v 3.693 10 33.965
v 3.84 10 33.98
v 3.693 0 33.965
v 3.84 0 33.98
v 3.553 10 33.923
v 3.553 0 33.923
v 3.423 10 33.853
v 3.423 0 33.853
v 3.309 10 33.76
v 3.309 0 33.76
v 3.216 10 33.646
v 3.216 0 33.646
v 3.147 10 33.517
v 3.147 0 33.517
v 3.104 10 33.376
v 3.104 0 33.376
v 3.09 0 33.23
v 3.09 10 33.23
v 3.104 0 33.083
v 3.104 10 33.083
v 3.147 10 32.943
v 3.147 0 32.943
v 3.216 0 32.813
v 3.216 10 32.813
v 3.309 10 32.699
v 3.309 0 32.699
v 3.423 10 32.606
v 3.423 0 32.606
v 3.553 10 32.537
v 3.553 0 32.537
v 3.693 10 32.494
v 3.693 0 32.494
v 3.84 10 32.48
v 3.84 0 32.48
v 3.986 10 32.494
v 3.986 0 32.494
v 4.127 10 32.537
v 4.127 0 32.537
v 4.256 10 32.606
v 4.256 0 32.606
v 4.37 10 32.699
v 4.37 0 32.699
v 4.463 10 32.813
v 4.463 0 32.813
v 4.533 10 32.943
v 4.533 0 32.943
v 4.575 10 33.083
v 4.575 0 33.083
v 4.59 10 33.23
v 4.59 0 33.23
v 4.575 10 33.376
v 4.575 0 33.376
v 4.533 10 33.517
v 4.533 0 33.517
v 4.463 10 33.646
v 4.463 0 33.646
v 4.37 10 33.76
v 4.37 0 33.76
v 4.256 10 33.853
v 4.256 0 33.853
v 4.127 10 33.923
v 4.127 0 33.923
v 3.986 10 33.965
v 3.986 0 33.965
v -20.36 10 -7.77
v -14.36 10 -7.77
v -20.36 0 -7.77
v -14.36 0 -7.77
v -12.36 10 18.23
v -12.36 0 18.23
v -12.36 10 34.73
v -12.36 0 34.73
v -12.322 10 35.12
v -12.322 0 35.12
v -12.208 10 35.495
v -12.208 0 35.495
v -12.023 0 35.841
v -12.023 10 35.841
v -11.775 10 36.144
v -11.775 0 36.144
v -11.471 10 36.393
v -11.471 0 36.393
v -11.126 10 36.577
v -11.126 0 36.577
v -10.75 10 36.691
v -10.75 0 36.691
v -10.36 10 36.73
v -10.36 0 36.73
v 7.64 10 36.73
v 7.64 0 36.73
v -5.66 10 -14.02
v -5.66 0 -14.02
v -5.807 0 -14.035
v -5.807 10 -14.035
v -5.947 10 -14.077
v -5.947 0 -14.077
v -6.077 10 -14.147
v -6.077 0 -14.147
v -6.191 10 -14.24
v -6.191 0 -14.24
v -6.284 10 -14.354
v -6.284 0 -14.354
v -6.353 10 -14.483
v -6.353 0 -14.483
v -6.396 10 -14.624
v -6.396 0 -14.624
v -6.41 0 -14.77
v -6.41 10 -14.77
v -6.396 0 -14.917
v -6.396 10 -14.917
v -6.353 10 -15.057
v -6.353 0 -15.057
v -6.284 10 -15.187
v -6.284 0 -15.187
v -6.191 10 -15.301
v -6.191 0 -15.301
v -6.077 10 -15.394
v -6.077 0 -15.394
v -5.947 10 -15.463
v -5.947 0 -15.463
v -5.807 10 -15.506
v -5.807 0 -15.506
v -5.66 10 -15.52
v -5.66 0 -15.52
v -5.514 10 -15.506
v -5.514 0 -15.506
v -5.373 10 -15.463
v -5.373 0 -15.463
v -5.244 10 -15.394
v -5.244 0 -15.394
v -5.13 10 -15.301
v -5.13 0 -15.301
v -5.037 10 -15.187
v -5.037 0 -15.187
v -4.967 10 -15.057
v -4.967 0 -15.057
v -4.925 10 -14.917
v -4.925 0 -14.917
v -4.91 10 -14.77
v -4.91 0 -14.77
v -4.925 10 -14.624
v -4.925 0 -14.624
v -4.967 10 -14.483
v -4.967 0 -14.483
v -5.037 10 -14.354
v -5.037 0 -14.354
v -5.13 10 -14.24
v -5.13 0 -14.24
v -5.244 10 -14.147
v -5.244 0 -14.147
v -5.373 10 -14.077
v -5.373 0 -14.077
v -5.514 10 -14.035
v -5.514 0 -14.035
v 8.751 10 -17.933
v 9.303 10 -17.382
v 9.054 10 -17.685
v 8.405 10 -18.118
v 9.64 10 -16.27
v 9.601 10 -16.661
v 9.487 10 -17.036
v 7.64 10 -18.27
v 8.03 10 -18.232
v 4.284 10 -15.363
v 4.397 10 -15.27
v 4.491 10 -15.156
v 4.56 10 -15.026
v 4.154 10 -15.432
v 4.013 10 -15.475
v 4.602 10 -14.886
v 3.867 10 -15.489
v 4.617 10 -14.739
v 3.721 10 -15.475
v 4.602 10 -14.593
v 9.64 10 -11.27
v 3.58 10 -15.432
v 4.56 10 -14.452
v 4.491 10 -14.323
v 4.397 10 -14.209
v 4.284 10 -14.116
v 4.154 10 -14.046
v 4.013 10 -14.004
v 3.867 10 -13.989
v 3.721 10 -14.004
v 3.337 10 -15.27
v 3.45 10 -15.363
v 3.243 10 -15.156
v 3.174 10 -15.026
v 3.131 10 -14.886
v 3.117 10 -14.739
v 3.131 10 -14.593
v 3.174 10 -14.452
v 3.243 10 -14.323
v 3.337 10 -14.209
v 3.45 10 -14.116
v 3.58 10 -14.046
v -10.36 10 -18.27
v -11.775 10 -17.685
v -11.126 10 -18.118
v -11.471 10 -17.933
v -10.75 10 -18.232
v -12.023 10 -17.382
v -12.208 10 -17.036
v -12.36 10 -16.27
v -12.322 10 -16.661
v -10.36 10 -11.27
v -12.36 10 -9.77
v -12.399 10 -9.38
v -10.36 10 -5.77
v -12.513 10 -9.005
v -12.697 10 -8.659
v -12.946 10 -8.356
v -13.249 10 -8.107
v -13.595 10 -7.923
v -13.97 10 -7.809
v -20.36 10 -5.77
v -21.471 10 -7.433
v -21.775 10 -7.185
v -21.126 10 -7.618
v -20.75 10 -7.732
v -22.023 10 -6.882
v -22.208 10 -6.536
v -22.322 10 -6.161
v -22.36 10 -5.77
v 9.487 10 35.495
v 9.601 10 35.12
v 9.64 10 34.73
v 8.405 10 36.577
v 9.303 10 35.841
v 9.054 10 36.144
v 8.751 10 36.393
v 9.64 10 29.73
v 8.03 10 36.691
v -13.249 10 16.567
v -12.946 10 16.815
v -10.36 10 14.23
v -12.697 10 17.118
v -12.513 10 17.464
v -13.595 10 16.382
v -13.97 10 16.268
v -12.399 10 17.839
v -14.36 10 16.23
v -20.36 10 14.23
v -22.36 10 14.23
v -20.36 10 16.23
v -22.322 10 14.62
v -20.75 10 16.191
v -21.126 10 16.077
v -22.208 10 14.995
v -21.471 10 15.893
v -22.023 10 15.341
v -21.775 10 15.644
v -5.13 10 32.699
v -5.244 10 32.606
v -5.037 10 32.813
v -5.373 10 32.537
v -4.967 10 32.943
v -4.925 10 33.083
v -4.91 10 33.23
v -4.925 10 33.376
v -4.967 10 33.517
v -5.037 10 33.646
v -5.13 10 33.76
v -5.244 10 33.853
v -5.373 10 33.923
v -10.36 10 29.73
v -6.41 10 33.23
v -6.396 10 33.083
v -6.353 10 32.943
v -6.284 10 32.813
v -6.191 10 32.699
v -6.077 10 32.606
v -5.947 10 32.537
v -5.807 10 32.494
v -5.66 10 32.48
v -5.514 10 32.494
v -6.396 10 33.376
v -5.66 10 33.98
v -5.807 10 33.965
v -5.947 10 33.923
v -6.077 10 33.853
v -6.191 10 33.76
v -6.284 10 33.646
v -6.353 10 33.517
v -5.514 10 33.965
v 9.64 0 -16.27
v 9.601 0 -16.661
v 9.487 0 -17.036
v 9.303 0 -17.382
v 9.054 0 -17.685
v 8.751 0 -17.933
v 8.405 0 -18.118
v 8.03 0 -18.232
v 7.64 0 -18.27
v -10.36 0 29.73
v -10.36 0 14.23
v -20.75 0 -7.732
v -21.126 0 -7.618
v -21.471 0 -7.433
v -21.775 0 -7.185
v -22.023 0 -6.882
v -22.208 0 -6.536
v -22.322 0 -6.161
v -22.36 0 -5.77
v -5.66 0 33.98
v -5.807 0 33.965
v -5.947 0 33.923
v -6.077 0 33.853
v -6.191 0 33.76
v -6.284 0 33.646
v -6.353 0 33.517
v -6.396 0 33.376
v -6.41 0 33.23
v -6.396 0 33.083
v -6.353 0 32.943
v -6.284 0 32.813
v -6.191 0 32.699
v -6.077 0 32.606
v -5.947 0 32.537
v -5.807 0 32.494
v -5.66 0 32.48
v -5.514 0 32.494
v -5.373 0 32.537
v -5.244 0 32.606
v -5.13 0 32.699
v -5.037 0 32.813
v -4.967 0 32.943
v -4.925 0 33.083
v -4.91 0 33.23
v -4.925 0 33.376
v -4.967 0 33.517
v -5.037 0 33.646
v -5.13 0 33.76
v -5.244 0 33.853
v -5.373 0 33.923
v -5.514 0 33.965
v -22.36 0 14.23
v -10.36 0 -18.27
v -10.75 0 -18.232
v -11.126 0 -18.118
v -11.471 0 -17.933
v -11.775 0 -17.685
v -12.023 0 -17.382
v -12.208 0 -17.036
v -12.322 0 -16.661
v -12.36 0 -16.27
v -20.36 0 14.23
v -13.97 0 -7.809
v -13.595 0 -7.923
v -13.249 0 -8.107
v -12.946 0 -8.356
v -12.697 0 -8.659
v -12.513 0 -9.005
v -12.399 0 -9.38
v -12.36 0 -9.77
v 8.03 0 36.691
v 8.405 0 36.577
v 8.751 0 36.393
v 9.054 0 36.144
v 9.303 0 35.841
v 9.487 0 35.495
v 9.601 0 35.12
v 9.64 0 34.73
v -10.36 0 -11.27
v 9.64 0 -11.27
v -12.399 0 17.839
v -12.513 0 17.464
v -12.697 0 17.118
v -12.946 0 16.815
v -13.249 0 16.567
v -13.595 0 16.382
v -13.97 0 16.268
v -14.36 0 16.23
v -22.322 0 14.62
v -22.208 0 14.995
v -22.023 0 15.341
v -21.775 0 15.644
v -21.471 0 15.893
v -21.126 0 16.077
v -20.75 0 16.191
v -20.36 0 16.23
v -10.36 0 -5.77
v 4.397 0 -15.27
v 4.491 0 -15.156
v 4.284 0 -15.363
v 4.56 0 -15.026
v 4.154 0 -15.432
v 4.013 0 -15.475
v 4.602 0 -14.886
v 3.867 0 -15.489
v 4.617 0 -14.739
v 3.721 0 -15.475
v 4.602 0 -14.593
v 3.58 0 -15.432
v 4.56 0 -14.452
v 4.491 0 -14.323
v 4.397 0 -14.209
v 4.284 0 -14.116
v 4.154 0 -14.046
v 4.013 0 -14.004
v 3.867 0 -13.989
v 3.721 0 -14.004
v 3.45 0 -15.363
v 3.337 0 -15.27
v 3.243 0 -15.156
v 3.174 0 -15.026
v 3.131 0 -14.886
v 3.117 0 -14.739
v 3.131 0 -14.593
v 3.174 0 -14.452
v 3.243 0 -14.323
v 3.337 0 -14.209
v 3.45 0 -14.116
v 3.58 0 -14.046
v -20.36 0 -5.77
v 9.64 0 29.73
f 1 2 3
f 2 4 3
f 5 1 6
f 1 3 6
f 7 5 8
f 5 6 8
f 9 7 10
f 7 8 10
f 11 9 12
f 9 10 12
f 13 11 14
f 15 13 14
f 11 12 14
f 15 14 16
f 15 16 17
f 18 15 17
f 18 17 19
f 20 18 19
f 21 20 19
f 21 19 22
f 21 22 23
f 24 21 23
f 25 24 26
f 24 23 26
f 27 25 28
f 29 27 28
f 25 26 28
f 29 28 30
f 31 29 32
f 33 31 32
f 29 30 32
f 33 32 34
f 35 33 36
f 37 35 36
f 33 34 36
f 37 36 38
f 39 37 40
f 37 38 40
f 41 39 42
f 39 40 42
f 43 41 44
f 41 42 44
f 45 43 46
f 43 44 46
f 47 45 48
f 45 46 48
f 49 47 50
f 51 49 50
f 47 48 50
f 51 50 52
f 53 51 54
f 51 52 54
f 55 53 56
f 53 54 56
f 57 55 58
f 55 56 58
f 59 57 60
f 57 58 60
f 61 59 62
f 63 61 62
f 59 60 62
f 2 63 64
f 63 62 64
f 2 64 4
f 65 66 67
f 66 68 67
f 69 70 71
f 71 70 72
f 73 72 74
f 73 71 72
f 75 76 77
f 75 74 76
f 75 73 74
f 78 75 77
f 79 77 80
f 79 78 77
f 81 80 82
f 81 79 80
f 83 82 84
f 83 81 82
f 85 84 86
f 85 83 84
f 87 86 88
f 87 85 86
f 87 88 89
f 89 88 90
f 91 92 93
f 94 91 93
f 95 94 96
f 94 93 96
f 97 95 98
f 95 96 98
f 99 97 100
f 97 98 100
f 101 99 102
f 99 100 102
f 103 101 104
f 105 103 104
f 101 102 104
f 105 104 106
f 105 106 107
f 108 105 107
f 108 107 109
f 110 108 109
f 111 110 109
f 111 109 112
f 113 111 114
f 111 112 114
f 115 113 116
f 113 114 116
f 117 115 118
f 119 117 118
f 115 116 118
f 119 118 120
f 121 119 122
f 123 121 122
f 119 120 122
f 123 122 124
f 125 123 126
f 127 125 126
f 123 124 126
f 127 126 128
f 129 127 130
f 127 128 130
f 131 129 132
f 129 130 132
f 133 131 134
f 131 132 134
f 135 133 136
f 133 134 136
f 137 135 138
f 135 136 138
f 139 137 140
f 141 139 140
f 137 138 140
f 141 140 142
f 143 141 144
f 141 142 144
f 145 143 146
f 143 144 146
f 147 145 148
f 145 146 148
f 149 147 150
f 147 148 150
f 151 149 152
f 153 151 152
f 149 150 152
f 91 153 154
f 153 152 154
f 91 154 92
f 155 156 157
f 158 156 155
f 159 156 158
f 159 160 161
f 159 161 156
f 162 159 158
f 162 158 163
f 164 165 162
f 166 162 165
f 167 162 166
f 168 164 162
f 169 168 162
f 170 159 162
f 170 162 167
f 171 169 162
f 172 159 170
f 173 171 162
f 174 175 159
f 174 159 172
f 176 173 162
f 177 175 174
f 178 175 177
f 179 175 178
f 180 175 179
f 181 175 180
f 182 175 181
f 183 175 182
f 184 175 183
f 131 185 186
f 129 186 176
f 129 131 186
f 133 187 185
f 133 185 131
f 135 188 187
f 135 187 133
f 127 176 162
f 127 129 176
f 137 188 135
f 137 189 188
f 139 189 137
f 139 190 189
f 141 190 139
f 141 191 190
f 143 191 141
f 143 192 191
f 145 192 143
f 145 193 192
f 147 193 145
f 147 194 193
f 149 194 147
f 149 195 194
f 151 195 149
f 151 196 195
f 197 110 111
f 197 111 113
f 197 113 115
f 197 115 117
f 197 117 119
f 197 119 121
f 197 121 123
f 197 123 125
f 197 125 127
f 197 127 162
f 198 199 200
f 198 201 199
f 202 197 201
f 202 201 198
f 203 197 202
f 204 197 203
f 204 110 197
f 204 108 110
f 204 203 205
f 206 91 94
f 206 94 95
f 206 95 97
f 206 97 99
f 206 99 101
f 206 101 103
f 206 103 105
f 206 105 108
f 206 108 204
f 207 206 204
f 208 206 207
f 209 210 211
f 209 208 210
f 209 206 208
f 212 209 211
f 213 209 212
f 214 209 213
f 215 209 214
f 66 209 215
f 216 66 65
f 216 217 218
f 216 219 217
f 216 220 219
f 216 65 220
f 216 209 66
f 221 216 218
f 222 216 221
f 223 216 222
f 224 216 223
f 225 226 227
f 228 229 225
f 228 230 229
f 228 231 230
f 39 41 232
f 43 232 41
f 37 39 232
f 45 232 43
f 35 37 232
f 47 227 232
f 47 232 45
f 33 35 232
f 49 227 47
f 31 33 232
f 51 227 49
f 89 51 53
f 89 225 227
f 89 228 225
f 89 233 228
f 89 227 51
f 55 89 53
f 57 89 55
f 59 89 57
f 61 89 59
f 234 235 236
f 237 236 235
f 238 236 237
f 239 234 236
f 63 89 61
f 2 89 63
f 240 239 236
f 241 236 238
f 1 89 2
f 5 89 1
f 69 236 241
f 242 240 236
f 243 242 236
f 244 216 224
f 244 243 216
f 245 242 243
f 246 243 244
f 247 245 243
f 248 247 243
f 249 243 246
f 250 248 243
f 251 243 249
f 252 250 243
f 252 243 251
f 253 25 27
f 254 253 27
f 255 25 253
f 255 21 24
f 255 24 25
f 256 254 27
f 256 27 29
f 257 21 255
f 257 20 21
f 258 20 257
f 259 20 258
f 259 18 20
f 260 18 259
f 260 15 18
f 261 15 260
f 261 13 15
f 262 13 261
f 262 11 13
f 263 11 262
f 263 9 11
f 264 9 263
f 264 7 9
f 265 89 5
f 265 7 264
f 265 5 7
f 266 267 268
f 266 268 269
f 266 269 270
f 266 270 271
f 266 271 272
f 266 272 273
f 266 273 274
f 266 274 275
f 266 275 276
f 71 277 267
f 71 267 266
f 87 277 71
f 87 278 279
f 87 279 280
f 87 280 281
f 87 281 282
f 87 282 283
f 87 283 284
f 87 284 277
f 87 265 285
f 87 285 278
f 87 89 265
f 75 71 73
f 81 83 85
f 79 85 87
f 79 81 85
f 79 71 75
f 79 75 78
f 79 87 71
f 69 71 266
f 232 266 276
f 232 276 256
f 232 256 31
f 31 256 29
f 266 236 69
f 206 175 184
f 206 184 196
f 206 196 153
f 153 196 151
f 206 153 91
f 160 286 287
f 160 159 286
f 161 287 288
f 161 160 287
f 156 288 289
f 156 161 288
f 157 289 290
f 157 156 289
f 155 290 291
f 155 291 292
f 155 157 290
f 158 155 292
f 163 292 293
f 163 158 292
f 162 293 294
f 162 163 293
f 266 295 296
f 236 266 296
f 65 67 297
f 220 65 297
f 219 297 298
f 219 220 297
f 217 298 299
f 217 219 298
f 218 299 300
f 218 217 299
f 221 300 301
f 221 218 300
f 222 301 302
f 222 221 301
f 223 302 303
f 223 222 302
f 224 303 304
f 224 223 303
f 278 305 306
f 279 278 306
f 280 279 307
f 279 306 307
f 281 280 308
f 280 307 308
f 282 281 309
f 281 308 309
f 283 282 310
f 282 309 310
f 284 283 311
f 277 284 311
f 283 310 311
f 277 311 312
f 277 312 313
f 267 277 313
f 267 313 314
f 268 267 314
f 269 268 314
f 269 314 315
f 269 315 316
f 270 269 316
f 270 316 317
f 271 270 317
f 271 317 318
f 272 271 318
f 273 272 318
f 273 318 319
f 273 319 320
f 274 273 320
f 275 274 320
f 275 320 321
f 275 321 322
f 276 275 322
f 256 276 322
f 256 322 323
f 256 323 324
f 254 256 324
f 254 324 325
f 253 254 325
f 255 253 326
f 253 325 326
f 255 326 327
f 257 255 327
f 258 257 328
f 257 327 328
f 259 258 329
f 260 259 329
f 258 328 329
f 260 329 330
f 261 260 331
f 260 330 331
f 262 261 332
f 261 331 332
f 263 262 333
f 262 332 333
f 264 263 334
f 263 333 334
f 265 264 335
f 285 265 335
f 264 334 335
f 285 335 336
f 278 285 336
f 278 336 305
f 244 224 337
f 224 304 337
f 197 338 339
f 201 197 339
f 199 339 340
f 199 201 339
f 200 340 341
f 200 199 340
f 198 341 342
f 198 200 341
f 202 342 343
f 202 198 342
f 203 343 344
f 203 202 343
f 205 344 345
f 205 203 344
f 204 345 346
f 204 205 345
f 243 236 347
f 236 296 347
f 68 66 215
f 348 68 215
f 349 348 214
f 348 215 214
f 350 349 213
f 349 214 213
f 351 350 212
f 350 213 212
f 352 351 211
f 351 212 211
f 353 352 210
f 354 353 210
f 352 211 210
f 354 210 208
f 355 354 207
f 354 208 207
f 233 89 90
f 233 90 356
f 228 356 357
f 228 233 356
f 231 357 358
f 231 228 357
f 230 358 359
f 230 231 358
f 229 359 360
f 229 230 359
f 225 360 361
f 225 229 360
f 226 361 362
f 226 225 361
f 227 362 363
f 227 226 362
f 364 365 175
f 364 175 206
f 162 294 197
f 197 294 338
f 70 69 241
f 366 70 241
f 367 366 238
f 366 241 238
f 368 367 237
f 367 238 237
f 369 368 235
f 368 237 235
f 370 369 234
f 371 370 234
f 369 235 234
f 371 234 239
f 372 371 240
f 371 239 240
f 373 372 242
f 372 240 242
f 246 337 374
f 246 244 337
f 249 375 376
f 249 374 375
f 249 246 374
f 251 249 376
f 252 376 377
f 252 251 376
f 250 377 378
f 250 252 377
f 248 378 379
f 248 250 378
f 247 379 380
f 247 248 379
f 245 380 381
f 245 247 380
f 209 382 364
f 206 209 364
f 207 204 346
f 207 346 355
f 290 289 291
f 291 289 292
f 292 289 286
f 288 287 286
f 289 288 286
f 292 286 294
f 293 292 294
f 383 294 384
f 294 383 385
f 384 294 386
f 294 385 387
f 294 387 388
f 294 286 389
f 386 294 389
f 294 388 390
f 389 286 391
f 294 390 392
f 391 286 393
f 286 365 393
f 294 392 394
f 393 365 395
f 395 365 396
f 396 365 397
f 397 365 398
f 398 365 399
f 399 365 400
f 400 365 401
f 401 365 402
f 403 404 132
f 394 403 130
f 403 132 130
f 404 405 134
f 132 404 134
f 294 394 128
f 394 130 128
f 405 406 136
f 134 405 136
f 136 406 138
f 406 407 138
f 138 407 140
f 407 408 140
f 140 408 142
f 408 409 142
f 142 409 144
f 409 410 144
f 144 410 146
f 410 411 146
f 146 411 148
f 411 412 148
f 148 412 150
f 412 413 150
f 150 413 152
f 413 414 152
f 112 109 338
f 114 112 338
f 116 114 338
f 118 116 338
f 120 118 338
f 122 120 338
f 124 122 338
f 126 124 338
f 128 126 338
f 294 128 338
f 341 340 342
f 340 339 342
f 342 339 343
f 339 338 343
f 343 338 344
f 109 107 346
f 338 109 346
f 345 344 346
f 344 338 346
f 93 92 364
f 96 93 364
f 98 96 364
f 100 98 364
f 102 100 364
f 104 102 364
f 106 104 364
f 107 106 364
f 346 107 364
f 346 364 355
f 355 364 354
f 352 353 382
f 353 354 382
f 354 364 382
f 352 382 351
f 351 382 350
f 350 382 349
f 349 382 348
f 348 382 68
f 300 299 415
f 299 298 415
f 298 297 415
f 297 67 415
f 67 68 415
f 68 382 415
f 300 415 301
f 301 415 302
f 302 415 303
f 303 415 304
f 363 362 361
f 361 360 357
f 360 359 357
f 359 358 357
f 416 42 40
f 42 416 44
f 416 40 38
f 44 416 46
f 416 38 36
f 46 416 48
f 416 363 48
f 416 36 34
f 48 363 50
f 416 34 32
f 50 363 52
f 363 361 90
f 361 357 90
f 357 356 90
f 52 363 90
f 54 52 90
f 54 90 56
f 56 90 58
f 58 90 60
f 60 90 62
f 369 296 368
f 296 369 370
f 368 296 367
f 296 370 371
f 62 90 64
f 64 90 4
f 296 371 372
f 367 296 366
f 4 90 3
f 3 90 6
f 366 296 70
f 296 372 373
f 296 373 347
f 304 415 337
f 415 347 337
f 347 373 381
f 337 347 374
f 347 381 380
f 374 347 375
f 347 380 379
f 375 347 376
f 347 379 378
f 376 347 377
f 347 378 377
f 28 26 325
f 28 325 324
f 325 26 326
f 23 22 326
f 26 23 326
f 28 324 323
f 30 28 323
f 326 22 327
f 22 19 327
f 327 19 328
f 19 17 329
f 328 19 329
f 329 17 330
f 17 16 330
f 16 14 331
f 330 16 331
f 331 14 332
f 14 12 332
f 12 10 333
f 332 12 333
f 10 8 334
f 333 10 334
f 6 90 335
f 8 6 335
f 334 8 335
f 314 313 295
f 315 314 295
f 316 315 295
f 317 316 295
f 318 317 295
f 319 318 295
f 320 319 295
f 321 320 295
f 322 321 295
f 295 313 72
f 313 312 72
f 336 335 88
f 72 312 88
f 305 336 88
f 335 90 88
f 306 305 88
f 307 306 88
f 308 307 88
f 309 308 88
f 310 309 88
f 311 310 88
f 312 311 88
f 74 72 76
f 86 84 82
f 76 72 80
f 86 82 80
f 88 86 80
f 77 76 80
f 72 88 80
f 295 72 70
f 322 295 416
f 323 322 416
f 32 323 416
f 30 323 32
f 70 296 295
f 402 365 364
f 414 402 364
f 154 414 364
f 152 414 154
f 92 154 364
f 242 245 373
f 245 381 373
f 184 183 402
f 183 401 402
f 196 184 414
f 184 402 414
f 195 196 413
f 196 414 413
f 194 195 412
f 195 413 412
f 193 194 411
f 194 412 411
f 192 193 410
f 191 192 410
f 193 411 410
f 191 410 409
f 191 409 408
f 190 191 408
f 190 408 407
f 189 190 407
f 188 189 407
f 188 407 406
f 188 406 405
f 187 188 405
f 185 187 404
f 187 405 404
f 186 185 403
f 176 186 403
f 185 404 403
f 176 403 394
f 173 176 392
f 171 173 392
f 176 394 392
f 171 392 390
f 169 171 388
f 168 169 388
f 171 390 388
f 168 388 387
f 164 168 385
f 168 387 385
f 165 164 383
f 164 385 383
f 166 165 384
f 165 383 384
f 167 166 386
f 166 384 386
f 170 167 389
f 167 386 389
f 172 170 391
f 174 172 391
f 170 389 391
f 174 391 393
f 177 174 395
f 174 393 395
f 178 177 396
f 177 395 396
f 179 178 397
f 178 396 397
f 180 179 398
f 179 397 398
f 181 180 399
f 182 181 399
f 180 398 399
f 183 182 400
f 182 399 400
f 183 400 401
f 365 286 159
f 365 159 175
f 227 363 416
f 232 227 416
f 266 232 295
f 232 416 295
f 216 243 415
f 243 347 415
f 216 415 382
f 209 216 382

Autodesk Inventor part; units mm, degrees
ref_plane "YZ Plane" through (0, 0, 0) normal (1, 0, 0) x (0, 1, 0)
ref_plane "XZ Plane" through (0, 0, 0) normal (0, 1, 0) x (-1, 0, 0)
ref_plane "XY Plane" through (0, 0, 0) normal (0, 0, 1) x (1, 0, 0)
sketch "Sketch1" plane through (0, 0, 0) normal (0, 1, 0) x (-1, 0, 0)
  line L0 (-9.6397, 29.7296) -> (10.3603, 29.7296)
  line L1 (12.3603, 29.7296) -> (12.3603, 36.7296)
  line L2 (12.3603, 36.7296) -> (-9.6397, 36.7296)
  line L3 (-9.6397, 36.7296) -> (-9.6397, 29.7296)
  line L4 (12.3603, 36.7296) -> (8.0662, 36.7296)
  line L5 (8.0662, -18.2704) -> (12.3603, -18.2704)
  line L6 (12.3603, -18.2704) -> (-9.6397, -18.2704)
  line L7 (-9.6397, -18.2704) -> (-9.6397, -11.2704)
  line L8 (-9.6397, -11.2704) -> (10.3603, -11.2704)
  line L9 (12.3603, -11.2704) -> (12.3603, -18.2704)
  line L10 (12.3603, -7.7704) -> (22.3603, -7.7704)
  line L11 (22.3603, -7.7704) -> (22.3603, 16.2296)
  line L12 (22.3603, 16.2296) -> (12.3603, 16.2296)
  line L13 (12.3603, -18.2704) -> (12.3603, -7.7704)
  line L14 (12.3603, 16.2296) -> (12.3603, 36.7296)
  line L15 (10.3603, 14.2296) -> (20.3603, 14.2296)
  line L16 (20.3603, 14.2296) -> (20.3603, -5.7704)
  line L17 (20.3603, -5.7704) -> (10.3603, -5.7704)
  line L18 (10.3603, 22.4354) -> (10.3603, 14.2296)
  line L19 (10.3603, -5.7704) -> (10.3603, -4.741)
  line L20 (10.3603, 29.7296) -> (10.3603, 14.2296)
  line L21 (10.3603, -5.7704) -> (10.3603, -11.2704)
  point P0 (0, 0)
  dimension "wall" = 2
  dimension "d1" = 2
  dimension "d2" = 2
  dimension "d3" = 2
  dimension "d4" = 2
  dimension "d5" = 7
  dimension "d6" = 7
  dimension "d7" = 20
  dimension "d8" = 20
  dimension "d9" = 41
  dimension "d10" = 5.5
  dimension "d11" = 20
  dimension "d12" = 10
extrude "Extrusion1" add sketch "Sketch1" along normal blind 10
sketch "Sketch2" plane through (0, 10, 0) normal (0, 1, 0) x (1, 0, 0)
  line L0 (-10.3603, -29.7296) -> (-10.3603, -14.2296) construction
  line L1 (-12.3603, -36.7296) -> (9.6397, -36.7296) construction
  line L2 (9.6397, 18.2704) -> (-12.3603, 18.2704) construction
  line L3 (3.8669, 14.7392) -> (-5.6603, 14.7392) construction
  line L4 (-5.6603, 14.7392) -> (-5.6603, -33.2296) construction
  line L5 (-5.6603, -33.2296) -> (3.8669, -33.2296) construction
  line L6 (3.8669, -33.2296) -> (3.8669, 14.7392) construction
  point P0 (0, 0)
  point P1 (3.8397, -33.2296)
  point P2 (-5.6603, 14.7704)
  dimension "d15" = 4.7
  dimension "d16" = 9.5
  dimension "d17" = 48
  dimension "d18" = 3.5
  dimension "d19" = 3.5
hole "Hole1" at (-5.6603, 10, 33.2296) at (3.8397, 10, 33.2296) at (3.8669, 10, -14.7392) at (-5.6603, 10, -14.7704) direction (0, -1, 0) diameter 1.5 end through all
fillet "Fillet1" radius 2 8 edges at (9.6397, 5, 36.7296) (-12.3603, 5, 36.7296) (9.6397, 5, -18.2704) (-12.3603, 5, -18.2704) (-22.3603, 5, -7.7704) (-12.3603, 5, -7.7704) (-22.3603, 5, 16.2296) (-12.3603, 5, 16.2296)
equation "\"d1\" = wall"
equation "\"d2\" = wall"
equation "\"d3\" = wall"
equation "\"d4\" = wall"
equation "\"d6\" = d5"
equation "\"d8\" = d7"
equation "\"d19\" = d18"
properties part number "servo_bracket"
